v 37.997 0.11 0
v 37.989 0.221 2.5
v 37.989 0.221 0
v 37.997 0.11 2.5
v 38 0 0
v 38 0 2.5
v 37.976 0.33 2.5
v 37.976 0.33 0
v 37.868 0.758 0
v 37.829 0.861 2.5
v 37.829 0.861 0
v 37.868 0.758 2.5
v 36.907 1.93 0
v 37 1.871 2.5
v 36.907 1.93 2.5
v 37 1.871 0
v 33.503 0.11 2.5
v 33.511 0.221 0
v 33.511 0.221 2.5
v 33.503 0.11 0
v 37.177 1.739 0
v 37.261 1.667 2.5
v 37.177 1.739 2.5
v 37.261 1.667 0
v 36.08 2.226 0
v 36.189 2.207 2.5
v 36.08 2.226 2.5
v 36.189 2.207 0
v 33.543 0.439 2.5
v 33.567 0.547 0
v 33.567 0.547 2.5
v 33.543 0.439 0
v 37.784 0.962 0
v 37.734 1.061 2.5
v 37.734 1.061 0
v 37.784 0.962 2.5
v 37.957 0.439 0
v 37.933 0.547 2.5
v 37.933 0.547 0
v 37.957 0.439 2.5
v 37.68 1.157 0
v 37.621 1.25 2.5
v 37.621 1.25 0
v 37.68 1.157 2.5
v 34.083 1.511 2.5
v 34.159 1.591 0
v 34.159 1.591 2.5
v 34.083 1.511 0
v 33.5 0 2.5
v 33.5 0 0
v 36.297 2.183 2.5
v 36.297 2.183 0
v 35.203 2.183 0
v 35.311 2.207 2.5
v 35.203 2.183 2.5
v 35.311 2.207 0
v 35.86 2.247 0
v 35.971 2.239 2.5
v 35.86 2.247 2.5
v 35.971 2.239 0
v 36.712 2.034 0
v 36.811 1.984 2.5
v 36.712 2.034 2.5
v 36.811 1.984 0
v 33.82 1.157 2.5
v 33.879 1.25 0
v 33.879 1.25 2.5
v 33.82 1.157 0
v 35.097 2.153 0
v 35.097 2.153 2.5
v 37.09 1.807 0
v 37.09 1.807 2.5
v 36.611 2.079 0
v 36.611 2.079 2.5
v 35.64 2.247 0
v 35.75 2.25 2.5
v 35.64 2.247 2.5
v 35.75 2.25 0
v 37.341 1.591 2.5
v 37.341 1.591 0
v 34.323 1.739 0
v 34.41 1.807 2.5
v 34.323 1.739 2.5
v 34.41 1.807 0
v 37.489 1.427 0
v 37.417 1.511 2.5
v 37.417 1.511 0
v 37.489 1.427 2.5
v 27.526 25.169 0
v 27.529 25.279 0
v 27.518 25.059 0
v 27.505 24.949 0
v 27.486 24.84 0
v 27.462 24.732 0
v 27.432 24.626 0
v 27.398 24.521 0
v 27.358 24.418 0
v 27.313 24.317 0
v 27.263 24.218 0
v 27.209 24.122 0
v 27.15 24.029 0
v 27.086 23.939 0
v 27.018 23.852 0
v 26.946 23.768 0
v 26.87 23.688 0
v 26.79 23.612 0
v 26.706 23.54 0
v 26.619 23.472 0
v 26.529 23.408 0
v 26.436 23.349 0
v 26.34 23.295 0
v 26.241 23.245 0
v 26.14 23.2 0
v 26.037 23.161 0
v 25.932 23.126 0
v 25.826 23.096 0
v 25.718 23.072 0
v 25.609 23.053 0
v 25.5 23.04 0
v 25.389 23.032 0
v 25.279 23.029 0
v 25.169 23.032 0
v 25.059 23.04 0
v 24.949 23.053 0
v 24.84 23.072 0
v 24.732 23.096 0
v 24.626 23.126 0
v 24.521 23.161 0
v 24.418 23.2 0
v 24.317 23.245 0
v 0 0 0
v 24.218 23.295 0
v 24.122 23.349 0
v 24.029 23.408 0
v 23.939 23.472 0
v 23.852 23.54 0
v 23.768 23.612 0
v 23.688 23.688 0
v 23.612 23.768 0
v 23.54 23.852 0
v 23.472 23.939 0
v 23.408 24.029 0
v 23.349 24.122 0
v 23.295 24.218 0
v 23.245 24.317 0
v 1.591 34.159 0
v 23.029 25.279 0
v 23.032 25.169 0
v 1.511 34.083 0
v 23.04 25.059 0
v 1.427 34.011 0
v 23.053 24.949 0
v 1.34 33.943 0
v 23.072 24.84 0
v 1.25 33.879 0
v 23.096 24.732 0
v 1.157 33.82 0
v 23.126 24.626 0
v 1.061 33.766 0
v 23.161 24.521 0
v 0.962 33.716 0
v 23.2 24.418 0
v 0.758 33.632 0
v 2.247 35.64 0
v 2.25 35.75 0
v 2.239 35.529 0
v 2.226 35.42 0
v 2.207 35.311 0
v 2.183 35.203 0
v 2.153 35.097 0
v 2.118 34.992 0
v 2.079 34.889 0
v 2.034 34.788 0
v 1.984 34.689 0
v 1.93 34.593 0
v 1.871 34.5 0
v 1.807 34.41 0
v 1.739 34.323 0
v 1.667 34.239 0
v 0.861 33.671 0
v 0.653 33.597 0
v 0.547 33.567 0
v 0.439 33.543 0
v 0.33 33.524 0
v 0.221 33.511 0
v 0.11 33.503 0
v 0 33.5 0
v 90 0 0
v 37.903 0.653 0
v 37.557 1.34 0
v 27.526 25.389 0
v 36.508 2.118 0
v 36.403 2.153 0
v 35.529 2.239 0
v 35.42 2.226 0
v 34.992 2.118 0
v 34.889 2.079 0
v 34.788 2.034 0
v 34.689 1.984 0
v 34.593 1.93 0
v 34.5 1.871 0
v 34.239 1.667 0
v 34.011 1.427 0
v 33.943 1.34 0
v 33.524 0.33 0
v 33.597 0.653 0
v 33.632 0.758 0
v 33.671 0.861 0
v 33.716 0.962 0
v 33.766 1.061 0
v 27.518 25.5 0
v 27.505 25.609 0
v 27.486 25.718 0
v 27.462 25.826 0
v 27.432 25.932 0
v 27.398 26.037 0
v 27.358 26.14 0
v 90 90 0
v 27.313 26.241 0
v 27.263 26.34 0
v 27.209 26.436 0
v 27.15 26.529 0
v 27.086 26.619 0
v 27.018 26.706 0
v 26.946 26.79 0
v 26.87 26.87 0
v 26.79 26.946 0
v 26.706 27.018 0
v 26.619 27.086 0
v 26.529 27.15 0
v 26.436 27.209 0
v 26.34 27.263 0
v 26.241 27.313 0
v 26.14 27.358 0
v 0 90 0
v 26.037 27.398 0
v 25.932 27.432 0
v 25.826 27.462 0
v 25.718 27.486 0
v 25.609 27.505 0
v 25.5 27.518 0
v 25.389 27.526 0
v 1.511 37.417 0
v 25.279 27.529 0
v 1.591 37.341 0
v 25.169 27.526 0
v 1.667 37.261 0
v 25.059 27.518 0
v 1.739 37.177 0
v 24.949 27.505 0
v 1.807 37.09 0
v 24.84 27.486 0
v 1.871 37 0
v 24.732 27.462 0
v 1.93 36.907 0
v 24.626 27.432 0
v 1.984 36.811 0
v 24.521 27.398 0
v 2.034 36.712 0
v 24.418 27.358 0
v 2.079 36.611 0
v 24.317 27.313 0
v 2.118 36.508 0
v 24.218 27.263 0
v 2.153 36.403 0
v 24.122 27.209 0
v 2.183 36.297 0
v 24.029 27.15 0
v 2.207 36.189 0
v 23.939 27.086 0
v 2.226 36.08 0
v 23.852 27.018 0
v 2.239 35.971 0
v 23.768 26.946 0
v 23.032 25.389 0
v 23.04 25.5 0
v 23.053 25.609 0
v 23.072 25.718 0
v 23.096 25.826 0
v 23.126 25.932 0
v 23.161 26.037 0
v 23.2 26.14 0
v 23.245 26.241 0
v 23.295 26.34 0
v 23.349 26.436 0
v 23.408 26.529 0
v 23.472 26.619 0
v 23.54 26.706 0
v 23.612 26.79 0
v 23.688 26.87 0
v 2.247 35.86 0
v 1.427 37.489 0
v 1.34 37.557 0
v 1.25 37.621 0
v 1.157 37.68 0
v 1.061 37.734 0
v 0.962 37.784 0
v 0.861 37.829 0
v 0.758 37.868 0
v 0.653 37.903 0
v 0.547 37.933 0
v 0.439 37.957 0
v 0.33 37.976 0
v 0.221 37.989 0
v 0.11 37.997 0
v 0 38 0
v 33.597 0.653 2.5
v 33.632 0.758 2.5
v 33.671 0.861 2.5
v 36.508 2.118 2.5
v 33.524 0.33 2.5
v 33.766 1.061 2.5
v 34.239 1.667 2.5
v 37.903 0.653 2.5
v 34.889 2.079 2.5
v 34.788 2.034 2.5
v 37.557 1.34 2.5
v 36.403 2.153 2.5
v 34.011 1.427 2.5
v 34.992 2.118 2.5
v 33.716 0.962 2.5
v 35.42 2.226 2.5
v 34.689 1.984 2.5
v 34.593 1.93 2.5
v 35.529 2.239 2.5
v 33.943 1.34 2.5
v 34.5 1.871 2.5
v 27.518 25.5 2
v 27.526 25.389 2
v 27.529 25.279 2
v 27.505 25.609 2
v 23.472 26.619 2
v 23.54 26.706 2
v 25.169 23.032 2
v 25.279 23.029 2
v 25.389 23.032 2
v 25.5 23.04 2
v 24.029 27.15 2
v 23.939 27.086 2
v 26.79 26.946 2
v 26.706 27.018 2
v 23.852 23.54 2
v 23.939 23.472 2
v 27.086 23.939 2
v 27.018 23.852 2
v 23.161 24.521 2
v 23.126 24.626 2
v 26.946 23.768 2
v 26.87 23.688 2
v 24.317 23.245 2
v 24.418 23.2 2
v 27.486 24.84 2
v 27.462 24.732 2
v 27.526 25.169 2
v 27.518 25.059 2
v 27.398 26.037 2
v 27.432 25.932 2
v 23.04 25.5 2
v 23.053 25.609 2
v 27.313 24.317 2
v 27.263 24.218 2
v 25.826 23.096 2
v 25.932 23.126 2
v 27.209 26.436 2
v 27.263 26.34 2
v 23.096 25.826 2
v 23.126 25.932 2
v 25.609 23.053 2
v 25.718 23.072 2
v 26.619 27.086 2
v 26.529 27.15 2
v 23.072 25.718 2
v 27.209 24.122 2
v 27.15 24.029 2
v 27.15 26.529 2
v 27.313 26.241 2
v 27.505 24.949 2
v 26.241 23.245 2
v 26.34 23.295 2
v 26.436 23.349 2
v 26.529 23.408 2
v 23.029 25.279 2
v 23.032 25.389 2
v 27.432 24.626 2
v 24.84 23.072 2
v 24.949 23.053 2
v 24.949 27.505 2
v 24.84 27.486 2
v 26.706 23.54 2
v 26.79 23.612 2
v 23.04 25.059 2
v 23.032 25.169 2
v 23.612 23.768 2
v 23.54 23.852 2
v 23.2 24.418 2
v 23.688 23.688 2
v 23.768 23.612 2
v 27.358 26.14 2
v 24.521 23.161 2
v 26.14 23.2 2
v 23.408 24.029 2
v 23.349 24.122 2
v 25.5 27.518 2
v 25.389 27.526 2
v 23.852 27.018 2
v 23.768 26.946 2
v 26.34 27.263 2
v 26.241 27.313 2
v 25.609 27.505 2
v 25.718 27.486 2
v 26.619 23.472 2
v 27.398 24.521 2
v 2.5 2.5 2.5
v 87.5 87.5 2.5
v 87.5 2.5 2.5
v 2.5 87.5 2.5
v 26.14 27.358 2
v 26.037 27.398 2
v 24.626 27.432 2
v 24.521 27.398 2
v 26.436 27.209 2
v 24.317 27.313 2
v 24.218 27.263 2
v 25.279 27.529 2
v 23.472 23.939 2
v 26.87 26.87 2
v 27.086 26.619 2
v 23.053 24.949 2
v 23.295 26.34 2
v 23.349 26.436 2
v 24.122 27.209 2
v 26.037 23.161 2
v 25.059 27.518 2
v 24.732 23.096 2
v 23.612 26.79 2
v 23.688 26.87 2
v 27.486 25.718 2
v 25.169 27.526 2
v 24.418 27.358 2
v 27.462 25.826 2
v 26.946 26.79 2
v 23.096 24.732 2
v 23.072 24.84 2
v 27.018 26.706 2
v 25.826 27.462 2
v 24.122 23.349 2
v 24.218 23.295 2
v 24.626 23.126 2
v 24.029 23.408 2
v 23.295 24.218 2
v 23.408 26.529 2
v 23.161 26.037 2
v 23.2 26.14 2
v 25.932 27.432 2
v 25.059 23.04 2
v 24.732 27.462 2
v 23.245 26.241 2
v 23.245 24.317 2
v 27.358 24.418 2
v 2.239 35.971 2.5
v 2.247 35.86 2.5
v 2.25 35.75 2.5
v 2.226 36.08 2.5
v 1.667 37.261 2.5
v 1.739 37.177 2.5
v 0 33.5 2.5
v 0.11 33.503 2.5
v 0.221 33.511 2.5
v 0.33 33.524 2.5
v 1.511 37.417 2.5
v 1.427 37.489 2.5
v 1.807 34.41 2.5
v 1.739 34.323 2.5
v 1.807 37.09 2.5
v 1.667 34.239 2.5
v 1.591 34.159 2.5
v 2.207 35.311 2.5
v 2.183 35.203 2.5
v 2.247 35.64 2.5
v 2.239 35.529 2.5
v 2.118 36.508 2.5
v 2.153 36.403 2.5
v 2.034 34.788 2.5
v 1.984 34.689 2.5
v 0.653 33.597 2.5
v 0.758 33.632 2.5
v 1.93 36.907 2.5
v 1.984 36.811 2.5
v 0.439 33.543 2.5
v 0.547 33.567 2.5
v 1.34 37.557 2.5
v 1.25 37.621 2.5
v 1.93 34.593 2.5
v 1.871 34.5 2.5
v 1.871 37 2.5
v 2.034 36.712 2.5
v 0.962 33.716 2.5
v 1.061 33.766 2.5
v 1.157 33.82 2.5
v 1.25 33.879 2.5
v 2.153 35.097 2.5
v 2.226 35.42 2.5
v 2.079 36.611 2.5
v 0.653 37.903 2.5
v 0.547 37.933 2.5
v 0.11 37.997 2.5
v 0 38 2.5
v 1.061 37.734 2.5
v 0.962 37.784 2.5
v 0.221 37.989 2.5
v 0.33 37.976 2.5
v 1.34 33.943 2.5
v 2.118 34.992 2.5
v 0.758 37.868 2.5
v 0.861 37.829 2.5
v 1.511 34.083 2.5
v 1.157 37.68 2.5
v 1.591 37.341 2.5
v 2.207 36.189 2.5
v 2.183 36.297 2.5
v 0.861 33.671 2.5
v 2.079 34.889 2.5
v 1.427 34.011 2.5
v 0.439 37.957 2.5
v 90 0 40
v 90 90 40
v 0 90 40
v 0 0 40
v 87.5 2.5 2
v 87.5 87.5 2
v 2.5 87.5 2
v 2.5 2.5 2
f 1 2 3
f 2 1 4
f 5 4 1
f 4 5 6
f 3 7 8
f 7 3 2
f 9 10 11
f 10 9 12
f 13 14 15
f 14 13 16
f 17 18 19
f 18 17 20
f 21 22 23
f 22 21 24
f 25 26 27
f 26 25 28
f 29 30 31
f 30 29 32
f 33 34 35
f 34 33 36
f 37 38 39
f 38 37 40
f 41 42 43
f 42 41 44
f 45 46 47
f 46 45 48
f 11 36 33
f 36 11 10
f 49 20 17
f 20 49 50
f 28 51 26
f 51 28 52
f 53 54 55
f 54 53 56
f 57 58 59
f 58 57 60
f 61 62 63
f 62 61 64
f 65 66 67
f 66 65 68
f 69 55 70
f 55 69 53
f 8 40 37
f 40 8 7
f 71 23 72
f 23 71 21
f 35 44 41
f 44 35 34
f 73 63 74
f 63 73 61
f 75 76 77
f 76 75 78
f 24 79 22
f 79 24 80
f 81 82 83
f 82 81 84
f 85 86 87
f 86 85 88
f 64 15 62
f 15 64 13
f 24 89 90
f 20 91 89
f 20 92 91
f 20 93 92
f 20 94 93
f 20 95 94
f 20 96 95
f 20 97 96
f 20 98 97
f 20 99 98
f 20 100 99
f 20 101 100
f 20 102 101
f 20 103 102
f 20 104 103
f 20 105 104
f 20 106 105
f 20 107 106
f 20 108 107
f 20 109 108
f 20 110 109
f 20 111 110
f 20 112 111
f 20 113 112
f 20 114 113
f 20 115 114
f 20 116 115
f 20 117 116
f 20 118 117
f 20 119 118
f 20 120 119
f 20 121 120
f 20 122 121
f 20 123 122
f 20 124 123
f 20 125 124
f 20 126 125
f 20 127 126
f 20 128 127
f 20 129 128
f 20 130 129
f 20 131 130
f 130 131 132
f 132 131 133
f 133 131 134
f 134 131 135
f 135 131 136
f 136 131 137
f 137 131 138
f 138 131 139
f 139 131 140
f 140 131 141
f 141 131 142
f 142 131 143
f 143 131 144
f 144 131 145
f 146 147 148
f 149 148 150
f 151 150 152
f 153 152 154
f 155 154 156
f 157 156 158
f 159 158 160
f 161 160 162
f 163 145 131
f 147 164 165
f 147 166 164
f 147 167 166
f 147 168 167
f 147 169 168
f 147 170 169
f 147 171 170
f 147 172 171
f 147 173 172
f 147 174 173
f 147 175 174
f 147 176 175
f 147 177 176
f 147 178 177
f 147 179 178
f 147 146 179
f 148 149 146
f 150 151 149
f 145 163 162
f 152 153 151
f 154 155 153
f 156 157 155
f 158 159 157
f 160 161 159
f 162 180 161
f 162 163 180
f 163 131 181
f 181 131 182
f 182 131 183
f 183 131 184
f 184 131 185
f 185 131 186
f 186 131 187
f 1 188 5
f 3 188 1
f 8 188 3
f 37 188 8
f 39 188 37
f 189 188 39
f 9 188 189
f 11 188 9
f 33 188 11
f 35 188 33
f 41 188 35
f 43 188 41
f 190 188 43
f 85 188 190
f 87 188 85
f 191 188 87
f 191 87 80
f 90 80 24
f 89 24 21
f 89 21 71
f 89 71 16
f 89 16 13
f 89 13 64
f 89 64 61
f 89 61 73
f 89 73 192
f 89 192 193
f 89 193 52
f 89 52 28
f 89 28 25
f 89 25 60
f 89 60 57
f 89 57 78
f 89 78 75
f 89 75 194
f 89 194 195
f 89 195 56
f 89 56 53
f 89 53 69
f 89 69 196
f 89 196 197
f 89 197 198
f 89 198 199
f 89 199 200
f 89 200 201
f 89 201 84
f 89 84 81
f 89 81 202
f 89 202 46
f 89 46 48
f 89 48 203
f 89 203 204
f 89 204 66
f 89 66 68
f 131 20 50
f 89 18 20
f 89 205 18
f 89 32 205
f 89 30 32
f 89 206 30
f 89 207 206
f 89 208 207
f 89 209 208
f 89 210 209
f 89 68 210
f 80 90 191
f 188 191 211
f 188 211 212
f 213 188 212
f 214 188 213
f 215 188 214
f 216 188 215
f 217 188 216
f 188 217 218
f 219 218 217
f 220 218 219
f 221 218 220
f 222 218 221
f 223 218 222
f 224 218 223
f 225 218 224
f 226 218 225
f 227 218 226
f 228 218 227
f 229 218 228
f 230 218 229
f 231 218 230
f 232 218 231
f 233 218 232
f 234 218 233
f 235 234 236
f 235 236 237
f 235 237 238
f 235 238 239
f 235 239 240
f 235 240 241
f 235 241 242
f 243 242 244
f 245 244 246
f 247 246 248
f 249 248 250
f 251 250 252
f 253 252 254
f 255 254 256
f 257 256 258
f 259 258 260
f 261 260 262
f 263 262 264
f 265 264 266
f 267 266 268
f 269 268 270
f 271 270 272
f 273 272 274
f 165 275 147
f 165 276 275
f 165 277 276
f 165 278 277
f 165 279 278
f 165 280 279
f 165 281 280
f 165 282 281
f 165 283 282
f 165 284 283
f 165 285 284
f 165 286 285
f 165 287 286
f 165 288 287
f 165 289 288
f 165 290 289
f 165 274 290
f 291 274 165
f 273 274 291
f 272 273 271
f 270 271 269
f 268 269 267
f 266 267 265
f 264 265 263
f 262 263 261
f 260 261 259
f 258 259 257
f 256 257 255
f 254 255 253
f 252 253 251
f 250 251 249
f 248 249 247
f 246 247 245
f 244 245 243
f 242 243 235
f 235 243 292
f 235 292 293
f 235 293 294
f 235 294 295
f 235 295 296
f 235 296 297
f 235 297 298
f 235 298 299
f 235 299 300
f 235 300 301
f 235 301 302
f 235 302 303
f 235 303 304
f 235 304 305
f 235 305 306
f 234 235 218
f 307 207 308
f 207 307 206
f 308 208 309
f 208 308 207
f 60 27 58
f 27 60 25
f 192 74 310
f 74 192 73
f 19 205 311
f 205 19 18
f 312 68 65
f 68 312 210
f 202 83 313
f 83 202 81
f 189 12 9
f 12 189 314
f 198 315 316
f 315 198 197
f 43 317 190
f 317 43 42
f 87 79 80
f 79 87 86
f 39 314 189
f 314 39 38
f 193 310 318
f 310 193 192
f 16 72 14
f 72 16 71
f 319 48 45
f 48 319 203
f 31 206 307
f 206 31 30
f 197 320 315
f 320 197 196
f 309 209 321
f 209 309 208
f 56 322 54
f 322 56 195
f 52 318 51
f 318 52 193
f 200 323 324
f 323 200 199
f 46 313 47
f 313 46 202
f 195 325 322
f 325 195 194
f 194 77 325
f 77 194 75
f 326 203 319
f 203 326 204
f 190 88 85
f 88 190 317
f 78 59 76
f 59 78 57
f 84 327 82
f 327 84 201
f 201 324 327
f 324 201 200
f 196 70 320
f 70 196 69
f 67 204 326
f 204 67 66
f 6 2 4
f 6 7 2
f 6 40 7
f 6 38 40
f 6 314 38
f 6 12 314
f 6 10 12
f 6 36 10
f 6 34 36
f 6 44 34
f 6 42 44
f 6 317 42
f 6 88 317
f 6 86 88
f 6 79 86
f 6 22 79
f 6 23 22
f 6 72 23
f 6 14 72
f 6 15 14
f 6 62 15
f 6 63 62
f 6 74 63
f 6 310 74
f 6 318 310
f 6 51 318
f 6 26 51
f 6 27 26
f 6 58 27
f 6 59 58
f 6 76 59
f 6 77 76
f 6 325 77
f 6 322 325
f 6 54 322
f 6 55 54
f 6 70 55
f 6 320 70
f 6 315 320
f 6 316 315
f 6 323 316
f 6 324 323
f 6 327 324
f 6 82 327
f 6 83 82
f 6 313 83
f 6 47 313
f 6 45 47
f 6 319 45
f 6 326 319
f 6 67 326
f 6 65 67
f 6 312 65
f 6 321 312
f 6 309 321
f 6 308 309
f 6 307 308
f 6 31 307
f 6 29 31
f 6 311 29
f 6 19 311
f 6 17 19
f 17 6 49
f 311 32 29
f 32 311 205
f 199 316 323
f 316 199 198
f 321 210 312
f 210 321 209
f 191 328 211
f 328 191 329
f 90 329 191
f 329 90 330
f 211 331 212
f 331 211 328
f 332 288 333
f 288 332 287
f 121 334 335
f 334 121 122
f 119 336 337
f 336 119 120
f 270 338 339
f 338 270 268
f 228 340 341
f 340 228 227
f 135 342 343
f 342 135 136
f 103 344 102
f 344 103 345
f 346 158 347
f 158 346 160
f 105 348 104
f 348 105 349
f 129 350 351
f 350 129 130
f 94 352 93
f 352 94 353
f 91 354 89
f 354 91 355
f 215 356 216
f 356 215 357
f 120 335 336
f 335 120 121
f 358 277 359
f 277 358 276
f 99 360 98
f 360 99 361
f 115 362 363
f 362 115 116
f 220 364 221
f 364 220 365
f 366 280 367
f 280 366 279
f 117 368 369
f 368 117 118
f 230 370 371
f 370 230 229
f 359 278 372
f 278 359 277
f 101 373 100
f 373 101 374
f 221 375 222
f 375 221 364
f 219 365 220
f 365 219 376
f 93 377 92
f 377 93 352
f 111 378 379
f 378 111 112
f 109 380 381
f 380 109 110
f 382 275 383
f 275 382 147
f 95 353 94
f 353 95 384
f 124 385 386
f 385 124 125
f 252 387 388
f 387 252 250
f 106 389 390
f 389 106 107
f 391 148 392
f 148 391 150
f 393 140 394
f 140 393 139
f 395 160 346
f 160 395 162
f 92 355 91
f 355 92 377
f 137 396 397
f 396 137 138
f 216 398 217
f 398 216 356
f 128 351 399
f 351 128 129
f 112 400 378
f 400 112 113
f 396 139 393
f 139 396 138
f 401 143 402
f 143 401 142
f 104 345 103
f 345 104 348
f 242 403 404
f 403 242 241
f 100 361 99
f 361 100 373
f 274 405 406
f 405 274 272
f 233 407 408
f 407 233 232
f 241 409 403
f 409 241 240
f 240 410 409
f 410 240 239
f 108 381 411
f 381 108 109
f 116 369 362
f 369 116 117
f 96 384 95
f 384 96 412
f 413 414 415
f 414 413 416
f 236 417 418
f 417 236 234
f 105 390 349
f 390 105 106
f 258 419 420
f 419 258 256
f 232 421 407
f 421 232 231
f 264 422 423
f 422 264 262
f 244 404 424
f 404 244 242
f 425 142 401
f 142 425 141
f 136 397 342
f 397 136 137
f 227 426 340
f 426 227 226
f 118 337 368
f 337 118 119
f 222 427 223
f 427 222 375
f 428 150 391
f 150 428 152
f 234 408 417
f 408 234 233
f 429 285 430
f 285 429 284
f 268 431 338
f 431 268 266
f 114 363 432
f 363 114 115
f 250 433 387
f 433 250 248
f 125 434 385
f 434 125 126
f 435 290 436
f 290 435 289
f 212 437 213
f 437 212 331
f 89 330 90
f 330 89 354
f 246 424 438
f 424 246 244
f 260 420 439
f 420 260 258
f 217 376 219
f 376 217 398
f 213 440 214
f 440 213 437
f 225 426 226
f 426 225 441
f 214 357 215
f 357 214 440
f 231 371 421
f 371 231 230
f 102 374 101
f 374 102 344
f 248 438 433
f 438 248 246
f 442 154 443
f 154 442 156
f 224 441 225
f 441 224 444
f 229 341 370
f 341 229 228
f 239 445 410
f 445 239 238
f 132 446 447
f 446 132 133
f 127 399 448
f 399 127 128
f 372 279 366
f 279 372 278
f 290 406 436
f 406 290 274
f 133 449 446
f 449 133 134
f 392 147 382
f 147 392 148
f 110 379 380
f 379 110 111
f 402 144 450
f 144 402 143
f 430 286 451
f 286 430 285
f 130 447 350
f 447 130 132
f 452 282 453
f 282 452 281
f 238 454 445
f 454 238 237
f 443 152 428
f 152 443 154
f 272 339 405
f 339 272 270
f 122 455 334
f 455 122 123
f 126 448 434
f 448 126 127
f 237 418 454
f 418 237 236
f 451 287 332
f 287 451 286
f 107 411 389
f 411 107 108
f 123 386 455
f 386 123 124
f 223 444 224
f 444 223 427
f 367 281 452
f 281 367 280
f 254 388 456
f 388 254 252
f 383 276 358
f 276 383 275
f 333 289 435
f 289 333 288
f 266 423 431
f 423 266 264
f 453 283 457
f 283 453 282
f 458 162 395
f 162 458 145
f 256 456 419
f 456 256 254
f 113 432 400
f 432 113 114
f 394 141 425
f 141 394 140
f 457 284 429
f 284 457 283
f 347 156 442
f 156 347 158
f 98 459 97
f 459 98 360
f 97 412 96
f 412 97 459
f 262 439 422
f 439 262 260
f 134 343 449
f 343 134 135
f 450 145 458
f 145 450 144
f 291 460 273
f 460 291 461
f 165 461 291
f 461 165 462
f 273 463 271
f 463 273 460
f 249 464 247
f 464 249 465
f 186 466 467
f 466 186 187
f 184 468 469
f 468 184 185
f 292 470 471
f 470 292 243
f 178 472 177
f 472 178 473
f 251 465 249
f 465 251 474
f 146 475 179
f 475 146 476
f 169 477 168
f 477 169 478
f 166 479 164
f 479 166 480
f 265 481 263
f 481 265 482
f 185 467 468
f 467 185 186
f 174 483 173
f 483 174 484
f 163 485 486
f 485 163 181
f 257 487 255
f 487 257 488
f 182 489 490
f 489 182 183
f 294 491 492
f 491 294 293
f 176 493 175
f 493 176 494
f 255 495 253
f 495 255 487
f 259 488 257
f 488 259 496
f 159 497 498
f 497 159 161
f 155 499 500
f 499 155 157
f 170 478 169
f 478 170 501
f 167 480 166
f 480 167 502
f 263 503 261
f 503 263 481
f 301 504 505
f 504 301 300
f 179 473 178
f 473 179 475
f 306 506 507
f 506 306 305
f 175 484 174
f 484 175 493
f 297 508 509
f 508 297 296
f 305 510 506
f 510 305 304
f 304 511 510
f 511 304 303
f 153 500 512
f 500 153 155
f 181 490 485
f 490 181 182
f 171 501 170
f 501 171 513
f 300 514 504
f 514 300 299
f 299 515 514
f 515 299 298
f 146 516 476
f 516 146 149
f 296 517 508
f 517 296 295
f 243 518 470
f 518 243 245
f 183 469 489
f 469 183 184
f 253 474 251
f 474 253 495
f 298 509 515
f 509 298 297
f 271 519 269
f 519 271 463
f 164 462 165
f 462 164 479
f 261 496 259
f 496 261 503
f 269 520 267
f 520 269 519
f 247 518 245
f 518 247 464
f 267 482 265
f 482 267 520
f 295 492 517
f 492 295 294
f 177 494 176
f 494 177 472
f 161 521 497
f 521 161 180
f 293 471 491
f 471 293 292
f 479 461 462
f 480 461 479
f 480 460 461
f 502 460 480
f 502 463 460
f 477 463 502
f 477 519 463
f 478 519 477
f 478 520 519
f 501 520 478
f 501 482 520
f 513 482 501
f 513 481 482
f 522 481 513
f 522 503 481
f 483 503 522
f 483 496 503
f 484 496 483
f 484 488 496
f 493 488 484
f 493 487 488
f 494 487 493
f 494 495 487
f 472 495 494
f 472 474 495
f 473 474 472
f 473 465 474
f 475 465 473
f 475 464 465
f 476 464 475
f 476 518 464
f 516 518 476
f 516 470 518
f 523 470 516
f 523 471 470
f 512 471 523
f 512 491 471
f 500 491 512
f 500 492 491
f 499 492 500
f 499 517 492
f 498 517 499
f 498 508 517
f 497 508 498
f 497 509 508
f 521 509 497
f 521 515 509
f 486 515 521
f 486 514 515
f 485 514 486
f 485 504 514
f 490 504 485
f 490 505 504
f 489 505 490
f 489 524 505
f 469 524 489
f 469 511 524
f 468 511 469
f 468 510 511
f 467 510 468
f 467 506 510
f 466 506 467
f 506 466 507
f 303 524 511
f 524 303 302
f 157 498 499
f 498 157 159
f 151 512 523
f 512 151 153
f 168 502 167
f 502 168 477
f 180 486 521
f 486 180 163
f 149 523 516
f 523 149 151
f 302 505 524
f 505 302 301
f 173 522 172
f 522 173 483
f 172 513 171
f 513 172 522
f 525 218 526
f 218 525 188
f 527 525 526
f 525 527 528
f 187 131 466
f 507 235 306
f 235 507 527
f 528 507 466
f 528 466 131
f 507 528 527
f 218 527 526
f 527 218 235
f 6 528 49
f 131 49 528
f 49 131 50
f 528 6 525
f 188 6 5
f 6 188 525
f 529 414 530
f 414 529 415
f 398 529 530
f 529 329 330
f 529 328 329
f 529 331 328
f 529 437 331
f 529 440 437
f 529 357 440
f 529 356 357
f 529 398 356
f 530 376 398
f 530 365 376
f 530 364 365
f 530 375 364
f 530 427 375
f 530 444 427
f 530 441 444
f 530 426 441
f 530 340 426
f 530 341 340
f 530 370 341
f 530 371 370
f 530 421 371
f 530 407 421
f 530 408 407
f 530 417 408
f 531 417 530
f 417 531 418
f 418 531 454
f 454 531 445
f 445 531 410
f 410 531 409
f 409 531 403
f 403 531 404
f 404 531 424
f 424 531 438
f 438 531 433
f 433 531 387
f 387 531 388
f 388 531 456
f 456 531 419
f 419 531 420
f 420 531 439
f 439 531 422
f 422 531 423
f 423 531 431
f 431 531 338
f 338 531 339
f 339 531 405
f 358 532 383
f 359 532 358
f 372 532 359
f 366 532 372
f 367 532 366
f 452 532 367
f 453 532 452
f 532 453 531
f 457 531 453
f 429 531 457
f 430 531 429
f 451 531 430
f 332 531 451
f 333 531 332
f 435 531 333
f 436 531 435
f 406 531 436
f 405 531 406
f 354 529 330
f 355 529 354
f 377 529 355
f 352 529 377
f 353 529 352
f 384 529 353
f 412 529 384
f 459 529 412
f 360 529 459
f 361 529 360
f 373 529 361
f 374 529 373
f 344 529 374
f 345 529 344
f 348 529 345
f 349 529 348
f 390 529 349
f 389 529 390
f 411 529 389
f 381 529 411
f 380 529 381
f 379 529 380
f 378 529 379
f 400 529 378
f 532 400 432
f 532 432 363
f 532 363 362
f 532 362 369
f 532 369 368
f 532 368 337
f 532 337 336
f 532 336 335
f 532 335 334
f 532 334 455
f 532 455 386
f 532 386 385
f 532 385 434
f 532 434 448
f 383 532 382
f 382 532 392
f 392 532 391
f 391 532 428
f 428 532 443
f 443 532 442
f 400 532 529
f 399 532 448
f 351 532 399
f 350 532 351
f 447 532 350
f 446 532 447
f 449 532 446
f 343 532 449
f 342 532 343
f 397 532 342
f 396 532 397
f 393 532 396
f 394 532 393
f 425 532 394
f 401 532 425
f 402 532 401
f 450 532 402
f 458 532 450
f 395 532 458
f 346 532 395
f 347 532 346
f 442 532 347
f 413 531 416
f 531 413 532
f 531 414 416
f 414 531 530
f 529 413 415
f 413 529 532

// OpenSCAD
// Magnetic stirrer housing for 80 mm PC case fan
// Print orientation: top plate on bed (z = 0), walls rise to z = 40, open top

// ---------- Parameters ----------
top_thickness      = 2;     // top plate thickness
wall_thickness     = 2.5;   // wall thickness
box_height         = 40;    // total height to open edge
outer_size         = 90;    // outer X and Y size of box
screw_hole_count   = 4;     // number of mounting holes
screw_hole_d       = 4.5;   // M4 screw hole diameter
screw_hole_pitch   = 71.5;  // square pattern pitch between holes
cable_notch_w      = 12;    // cable notch width
cable_notch_depth  = 8;     // notch depth from open edge (z = 32 to 40)
eps                = 0.5;   // overcut for clean boolean differences

$fn = 128;

// ---------- Derived ----------
inner_size = outer_size - 2 * wall_thickness;   // 85 x 85
floor_z    = top_thickness;                     // floor of open box (z = 2)

// ---------- Model ----------
difference() {
    // Solid box, open at top
    translate([0, 0, 0])
        cube([outer_size, outer_size, box_height]);

    // Open top (through the last wall)
    translate([wall_thickness, wall_thickness, floor_z])
        cube([inner_size, inner_size, eps]);

    // Screw holes in top plate
    for (i = [0 : screw_hole_count - 1]) {
        a = screw_hole_pitch / 2;
        x = a * cos(45 * i);
        y = a * sin(45 * i);
        translate([x, y, 0])
            cylinder(d = screw_hole_d, h = top_thickness + eps);
    }

    // Cable notch in one wall (centred along the wall, X = -45)
    translate([-outer_size / 2, -cable_notch_w / 2, floor_z])
        cube([cable_notch_w, outer_size, cable_notch_depth]);
}
